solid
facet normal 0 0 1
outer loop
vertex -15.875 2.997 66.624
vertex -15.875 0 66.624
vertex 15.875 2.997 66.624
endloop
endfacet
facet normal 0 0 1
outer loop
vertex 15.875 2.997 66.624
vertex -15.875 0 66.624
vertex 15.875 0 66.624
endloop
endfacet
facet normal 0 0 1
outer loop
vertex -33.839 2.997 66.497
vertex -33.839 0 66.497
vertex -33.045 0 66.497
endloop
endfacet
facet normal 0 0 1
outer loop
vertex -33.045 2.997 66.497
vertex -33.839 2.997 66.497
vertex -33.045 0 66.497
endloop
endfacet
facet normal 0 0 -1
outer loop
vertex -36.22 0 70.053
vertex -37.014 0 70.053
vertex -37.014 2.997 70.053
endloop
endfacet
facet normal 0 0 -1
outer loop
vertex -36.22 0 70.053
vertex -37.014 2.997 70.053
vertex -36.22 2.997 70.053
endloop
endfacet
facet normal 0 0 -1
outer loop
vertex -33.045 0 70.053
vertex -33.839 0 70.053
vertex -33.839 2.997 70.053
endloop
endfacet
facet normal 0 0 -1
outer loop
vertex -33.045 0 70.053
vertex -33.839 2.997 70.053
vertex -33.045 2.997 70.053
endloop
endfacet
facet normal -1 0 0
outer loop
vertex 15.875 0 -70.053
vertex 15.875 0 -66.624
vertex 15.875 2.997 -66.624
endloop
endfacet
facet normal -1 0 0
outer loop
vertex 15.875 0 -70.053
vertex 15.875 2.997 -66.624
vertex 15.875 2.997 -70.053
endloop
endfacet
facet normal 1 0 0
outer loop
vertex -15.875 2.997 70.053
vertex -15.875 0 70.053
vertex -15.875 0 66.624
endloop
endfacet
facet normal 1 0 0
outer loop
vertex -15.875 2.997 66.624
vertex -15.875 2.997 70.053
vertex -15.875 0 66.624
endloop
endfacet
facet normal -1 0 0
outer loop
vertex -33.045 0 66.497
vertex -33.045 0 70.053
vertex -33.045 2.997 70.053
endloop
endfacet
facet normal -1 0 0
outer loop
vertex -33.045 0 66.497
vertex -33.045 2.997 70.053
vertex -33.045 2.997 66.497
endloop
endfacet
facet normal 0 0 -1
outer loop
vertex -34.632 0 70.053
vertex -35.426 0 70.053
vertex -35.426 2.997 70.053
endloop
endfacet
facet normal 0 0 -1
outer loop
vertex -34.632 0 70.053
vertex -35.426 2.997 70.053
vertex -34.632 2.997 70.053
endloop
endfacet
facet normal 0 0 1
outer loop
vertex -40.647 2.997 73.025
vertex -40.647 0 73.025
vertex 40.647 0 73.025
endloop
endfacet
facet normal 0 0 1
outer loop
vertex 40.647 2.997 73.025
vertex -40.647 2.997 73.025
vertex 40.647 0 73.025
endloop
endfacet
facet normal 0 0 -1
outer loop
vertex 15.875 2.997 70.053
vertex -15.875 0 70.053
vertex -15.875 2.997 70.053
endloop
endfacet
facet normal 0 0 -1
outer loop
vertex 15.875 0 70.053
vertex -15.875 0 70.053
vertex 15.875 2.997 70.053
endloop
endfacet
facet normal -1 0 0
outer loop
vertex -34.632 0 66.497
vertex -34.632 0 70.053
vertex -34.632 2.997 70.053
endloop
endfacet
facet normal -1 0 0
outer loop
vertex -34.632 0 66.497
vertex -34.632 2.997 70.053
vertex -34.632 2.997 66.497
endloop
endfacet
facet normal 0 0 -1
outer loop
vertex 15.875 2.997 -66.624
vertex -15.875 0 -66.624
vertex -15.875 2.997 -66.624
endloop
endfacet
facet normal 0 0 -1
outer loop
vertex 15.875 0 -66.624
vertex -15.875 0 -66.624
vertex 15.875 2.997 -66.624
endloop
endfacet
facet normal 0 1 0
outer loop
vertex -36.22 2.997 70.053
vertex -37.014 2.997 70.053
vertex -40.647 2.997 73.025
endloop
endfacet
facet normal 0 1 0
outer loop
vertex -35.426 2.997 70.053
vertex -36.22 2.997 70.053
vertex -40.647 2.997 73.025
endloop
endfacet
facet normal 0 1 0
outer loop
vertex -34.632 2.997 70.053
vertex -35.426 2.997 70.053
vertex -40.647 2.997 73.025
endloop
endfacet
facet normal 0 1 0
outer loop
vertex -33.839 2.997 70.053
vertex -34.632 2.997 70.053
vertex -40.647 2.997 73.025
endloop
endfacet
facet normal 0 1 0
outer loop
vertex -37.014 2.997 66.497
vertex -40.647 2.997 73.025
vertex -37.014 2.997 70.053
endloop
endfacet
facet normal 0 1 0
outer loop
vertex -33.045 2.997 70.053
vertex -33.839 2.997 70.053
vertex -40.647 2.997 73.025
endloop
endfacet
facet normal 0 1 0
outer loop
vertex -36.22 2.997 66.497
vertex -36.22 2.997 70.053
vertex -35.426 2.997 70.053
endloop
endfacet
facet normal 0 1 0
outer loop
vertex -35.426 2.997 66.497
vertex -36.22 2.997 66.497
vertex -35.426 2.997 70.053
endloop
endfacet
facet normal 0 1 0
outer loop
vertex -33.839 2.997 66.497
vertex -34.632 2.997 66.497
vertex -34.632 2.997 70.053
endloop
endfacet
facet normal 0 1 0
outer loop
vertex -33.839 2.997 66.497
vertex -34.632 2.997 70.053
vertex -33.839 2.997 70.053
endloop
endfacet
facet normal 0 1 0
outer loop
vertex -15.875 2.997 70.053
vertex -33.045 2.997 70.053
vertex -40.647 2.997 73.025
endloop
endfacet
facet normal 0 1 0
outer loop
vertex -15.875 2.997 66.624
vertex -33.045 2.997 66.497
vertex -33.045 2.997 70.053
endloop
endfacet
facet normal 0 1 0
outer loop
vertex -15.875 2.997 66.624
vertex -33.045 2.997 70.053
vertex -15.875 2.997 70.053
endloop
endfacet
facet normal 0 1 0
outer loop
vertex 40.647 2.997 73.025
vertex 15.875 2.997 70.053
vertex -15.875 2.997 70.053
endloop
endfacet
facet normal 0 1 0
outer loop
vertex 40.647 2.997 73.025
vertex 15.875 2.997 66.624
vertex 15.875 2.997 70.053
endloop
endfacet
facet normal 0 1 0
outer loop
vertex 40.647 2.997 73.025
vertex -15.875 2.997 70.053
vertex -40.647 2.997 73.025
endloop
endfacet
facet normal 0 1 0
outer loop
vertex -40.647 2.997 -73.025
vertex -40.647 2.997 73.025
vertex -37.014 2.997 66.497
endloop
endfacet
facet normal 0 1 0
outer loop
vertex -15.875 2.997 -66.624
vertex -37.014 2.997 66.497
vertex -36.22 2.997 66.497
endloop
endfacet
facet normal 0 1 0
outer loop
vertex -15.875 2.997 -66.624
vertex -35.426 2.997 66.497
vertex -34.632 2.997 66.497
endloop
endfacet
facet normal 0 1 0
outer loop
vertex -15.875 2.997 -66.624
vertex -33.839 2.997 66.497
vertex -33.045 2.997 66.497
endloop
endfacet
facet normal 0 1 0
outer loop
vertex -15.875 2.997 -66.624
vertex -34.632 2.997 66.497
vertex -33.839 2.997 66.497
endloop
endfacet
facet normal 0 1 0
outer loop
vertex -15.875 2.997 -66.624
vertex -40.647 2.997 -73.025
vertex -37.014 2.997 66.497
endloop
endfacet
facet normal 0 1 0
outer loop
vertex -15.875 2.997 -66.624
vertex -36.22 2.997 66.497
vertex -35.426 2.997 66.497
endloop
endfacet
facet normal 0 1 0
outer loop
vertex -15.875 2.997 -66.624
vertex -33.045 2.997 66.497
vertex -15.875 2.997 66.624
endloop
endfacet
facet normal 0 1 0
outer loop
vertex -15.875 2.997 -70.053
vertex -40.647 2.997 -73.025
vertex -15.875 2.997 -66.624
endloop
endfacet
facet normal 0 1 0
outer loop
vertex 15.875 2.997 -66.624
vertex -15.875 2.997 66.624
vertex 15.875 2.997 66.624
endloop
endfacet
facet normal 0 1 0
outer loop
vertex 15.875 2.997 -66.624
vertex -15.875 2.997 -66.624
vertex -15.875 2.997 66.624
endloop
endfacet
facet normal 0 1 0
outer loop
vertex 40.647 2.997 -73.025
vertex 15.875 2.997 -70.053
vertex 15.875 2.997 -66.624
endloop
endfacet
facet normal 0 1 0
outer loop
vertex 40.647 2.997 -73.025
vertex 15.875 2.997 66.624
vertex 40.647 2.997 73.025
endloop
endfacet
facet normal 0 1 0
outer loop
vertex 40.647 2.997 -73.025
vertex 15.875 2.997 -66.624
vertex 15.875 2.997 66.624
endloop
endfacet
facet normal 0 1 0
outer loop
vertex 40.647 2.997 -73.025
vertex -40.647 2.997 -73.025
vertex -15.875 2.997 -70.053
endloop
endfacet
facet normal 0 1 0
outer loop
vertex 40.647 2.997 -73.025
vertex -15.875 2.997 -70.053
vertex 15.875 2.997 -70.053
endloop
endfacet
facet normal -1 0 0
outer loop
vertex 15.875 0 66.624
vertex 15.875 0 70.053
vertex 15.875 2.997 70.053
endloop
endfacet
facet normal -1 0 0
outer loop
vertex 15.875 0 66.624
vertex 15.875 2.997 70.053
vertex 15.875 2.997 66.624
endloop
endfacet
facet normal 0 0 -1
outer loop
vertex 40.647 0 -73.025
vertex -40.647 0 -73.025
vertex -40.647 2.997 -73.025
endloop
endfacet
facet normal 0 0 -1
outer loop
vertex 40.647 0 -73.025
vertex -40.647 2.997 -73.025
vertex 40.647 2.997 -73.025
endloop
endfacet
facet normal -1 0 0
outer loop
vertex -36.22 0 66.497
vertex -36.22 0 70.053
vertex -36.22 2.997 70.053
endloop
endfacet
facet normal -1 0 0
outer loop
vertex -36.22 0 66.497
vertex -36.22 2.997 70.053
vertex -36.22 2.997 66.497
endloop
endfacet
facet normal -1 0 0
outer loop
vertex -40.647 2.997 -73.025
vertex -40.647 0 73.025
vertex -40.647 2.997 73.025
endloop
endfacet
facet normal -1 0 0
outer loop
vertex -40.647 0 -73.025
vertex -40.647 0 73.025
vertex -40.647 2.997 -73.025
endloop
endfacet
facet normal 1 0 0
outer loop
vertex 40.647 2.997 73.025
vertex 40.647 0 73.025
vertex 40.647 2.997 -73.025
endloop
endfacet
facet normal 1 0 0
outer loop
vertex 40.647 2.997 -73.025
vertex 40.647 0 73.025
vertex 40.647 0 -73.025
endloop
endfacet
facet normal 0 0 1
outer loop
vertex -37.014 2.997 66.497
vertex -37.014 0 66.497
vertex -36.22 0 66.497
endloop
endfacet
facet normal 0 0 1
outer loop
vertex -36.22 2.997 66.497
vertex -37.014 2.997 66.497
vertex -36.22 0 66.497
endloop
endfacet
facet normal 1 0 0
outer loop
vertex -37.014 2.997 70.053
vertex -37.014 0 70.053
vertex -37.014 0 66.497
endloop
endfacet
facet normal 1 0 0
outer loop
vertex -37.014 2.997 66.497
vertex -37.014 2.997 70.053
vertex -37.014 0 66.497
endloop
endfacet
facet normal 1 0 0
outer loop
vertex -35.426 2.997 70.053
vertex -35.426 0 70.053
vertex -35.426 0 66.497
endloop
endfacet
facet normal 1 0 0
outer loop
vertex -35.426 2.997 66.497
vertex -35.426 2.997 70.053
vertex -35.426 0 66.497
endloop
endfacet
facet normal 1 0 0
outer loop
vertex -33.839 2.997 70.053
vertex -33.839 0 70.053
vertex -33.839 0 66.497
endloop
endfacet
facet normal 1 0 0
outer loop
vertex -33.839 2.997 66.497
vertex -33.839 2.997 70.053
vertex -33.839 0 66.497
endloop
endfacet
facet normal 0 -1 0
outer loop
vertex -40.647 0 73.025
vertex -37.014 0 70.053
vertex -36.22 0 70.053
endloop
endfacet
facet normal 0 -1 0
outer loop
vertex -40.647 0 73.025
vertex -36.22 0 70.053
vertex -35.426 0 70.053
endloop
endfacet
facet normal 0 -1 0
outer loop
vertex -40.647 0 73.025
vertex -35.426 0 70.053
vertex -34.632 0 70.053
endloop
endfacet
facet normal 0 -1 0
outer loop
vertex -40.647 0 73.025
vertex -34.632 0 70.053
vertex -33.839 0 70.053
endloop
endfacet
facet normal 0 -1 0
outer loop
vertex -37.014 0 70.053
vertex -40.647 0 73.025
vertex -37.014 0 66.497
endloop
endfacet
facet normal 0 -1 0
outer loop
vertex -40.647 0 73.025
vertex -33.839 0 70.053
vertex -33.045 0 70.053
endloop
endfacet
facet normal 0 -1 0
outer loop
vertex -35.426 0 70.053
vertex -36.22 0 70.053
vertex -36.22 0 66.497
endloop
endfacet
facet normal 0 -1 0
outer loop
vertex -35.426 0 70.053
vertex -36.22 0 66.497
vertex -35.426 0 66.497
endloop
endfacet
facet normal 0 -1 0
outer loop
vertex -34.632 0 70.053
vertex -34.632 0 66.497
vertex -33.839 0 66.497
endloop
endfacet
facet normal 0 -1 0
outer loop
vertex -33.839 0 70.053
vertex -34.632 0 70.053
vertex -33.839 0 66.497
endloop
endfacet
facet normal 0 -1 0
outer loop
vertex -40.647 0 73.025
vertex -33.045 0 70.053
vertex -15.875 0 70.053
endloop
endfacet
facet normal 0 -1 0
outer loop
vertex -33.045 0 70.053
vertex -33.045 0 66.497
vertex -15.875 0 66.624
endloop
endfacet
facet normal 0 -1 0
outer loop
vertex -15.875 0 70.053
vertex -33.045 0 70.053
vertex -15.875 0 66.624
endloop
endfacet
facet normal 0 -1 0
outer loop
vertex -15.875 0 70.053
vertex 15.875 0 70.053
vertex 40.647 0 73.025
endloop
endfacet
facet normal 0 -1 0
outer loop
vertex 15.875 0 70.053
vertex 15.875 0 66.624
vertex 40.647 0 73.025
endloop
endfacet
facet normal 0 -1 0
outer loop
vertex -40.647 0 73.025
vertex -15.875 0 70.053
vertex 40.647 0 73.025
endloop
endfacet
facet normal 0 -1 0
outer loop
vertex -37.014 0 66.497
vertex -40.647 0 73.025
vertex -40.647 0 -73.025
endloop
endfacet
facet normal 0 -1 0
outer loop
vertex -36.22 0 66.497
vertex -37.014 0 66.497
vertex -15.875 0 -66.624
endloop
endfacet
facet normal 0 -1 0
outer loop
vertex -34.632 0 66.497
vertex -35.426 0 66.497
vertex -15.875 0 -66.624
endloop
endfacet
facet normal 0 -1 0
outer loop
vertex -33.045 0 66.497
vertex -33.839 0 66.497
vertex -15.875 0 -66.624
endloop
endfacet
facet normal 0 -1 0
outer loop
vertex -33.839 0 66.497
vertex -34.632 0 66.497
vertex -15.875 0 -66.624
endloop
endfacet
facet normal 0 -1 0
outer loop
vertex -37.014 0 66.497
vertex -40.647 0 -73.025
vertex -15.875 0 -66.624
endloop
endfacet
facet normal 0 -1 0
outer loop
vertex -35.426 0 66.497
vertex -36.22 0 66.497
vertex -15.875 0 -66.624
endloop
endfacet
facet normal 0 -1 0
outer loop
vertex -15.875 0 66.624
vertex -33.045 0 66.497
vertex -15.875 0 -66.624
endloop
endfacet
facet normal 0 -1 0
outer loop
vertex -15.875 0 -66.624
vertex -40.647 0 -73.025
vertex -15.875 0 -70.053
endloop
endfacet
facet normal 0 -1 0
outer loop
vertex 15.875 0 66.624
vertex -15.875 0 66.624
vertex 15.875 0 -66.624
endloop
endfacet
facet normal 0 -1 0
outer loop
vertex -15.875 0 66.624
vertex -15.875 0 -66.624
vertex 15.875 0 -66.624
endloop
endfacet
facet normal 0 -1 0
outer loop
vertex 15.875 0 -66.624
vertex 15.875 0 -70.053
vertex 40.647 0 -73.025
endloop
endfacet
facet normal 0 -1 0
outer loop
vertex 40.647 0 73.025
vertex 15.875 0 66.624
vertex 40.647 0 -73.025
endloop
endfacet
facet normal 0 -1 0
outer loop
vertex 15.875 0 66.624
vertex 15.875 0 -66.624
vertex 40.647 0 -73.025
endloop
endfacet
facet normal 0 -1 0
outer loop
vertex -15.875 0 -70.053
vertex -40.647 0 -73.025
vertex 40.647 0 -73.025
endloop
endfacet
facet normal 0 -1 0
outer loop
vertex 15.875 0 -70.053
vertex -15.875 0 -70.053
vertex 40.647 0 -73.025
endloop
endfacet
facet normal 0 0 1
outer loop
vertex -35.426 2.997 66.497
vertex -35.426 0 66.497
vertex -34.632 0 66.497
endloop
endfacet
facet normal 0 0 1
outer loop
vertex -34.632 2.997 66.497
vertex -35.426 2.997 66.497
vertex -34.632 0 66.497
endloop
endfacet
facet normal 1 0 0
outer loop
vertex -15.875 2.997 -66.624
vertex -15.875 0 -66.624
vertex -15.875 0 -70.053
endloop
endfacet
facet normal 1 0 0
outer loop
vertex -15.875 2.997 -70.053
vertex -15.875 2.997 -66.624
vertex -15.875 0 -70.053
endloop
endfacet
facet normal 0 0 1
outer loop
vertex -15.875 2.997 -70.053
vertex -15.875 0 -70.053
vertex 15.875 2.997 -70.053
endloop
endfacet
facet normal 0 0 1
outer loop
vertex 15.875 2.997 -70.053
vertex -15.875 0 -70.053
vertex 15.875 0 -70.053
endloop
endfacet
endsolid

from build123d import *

# Parameters (mm, degrees)
SKETCH1_W           = 81.2942748
SKETCH1_H           = 146.05
SKETCH1_W_2         = 31.75
SKETCH1_H_2         = 3.429
SKETCH1_W_3         = 0.79375
SKETCH1_H_3         = 3.556
BOSS_EXTRUDE1_DEPTH = 2.9972


with BuildPart() as part:
    # Sketch1 → Boss-Extrude1 (new body)
    with BuildSketch(Plane(origin=(0, 0, 0), x_dir=(1, 0, 0), z_dir=(0, 1, 0))):
        Rectangle(SKETCH1_W, SKETCH1_H)
        with Locations((0, 68.3387)):
            Rectangle(SKETCH1_W_2, SKETCH1_H_2, mode=Mode.SUBTRACT)
        with Locations((0, -68.3387)):
            Rectangle(SKETCH1_W_2, SKETCH1_H_2, mode=Mode.SUBTRACT)
        with Locations((-36.61676177, -68.2752)):
            Rectangle(SKETCH1_W_3, SKETCH1_H_3, mode=Mode.SUBTRACT)
        with Locations((-35.02926177, -68.2752)):
            Rectangle(SKETCH1_W_3, SKETCH1_H_3, mode=Mode.SUBTRACT)
        with Locations((-33.44176177, -68.2752)):
            Rectangle(SKETCH1_W_3, SKETCH1_H_3, mode=Mode.SUBTRACT)
    extrude(amount=BOSS_EXTRUDE1_DEPTH)


solid = part.part
